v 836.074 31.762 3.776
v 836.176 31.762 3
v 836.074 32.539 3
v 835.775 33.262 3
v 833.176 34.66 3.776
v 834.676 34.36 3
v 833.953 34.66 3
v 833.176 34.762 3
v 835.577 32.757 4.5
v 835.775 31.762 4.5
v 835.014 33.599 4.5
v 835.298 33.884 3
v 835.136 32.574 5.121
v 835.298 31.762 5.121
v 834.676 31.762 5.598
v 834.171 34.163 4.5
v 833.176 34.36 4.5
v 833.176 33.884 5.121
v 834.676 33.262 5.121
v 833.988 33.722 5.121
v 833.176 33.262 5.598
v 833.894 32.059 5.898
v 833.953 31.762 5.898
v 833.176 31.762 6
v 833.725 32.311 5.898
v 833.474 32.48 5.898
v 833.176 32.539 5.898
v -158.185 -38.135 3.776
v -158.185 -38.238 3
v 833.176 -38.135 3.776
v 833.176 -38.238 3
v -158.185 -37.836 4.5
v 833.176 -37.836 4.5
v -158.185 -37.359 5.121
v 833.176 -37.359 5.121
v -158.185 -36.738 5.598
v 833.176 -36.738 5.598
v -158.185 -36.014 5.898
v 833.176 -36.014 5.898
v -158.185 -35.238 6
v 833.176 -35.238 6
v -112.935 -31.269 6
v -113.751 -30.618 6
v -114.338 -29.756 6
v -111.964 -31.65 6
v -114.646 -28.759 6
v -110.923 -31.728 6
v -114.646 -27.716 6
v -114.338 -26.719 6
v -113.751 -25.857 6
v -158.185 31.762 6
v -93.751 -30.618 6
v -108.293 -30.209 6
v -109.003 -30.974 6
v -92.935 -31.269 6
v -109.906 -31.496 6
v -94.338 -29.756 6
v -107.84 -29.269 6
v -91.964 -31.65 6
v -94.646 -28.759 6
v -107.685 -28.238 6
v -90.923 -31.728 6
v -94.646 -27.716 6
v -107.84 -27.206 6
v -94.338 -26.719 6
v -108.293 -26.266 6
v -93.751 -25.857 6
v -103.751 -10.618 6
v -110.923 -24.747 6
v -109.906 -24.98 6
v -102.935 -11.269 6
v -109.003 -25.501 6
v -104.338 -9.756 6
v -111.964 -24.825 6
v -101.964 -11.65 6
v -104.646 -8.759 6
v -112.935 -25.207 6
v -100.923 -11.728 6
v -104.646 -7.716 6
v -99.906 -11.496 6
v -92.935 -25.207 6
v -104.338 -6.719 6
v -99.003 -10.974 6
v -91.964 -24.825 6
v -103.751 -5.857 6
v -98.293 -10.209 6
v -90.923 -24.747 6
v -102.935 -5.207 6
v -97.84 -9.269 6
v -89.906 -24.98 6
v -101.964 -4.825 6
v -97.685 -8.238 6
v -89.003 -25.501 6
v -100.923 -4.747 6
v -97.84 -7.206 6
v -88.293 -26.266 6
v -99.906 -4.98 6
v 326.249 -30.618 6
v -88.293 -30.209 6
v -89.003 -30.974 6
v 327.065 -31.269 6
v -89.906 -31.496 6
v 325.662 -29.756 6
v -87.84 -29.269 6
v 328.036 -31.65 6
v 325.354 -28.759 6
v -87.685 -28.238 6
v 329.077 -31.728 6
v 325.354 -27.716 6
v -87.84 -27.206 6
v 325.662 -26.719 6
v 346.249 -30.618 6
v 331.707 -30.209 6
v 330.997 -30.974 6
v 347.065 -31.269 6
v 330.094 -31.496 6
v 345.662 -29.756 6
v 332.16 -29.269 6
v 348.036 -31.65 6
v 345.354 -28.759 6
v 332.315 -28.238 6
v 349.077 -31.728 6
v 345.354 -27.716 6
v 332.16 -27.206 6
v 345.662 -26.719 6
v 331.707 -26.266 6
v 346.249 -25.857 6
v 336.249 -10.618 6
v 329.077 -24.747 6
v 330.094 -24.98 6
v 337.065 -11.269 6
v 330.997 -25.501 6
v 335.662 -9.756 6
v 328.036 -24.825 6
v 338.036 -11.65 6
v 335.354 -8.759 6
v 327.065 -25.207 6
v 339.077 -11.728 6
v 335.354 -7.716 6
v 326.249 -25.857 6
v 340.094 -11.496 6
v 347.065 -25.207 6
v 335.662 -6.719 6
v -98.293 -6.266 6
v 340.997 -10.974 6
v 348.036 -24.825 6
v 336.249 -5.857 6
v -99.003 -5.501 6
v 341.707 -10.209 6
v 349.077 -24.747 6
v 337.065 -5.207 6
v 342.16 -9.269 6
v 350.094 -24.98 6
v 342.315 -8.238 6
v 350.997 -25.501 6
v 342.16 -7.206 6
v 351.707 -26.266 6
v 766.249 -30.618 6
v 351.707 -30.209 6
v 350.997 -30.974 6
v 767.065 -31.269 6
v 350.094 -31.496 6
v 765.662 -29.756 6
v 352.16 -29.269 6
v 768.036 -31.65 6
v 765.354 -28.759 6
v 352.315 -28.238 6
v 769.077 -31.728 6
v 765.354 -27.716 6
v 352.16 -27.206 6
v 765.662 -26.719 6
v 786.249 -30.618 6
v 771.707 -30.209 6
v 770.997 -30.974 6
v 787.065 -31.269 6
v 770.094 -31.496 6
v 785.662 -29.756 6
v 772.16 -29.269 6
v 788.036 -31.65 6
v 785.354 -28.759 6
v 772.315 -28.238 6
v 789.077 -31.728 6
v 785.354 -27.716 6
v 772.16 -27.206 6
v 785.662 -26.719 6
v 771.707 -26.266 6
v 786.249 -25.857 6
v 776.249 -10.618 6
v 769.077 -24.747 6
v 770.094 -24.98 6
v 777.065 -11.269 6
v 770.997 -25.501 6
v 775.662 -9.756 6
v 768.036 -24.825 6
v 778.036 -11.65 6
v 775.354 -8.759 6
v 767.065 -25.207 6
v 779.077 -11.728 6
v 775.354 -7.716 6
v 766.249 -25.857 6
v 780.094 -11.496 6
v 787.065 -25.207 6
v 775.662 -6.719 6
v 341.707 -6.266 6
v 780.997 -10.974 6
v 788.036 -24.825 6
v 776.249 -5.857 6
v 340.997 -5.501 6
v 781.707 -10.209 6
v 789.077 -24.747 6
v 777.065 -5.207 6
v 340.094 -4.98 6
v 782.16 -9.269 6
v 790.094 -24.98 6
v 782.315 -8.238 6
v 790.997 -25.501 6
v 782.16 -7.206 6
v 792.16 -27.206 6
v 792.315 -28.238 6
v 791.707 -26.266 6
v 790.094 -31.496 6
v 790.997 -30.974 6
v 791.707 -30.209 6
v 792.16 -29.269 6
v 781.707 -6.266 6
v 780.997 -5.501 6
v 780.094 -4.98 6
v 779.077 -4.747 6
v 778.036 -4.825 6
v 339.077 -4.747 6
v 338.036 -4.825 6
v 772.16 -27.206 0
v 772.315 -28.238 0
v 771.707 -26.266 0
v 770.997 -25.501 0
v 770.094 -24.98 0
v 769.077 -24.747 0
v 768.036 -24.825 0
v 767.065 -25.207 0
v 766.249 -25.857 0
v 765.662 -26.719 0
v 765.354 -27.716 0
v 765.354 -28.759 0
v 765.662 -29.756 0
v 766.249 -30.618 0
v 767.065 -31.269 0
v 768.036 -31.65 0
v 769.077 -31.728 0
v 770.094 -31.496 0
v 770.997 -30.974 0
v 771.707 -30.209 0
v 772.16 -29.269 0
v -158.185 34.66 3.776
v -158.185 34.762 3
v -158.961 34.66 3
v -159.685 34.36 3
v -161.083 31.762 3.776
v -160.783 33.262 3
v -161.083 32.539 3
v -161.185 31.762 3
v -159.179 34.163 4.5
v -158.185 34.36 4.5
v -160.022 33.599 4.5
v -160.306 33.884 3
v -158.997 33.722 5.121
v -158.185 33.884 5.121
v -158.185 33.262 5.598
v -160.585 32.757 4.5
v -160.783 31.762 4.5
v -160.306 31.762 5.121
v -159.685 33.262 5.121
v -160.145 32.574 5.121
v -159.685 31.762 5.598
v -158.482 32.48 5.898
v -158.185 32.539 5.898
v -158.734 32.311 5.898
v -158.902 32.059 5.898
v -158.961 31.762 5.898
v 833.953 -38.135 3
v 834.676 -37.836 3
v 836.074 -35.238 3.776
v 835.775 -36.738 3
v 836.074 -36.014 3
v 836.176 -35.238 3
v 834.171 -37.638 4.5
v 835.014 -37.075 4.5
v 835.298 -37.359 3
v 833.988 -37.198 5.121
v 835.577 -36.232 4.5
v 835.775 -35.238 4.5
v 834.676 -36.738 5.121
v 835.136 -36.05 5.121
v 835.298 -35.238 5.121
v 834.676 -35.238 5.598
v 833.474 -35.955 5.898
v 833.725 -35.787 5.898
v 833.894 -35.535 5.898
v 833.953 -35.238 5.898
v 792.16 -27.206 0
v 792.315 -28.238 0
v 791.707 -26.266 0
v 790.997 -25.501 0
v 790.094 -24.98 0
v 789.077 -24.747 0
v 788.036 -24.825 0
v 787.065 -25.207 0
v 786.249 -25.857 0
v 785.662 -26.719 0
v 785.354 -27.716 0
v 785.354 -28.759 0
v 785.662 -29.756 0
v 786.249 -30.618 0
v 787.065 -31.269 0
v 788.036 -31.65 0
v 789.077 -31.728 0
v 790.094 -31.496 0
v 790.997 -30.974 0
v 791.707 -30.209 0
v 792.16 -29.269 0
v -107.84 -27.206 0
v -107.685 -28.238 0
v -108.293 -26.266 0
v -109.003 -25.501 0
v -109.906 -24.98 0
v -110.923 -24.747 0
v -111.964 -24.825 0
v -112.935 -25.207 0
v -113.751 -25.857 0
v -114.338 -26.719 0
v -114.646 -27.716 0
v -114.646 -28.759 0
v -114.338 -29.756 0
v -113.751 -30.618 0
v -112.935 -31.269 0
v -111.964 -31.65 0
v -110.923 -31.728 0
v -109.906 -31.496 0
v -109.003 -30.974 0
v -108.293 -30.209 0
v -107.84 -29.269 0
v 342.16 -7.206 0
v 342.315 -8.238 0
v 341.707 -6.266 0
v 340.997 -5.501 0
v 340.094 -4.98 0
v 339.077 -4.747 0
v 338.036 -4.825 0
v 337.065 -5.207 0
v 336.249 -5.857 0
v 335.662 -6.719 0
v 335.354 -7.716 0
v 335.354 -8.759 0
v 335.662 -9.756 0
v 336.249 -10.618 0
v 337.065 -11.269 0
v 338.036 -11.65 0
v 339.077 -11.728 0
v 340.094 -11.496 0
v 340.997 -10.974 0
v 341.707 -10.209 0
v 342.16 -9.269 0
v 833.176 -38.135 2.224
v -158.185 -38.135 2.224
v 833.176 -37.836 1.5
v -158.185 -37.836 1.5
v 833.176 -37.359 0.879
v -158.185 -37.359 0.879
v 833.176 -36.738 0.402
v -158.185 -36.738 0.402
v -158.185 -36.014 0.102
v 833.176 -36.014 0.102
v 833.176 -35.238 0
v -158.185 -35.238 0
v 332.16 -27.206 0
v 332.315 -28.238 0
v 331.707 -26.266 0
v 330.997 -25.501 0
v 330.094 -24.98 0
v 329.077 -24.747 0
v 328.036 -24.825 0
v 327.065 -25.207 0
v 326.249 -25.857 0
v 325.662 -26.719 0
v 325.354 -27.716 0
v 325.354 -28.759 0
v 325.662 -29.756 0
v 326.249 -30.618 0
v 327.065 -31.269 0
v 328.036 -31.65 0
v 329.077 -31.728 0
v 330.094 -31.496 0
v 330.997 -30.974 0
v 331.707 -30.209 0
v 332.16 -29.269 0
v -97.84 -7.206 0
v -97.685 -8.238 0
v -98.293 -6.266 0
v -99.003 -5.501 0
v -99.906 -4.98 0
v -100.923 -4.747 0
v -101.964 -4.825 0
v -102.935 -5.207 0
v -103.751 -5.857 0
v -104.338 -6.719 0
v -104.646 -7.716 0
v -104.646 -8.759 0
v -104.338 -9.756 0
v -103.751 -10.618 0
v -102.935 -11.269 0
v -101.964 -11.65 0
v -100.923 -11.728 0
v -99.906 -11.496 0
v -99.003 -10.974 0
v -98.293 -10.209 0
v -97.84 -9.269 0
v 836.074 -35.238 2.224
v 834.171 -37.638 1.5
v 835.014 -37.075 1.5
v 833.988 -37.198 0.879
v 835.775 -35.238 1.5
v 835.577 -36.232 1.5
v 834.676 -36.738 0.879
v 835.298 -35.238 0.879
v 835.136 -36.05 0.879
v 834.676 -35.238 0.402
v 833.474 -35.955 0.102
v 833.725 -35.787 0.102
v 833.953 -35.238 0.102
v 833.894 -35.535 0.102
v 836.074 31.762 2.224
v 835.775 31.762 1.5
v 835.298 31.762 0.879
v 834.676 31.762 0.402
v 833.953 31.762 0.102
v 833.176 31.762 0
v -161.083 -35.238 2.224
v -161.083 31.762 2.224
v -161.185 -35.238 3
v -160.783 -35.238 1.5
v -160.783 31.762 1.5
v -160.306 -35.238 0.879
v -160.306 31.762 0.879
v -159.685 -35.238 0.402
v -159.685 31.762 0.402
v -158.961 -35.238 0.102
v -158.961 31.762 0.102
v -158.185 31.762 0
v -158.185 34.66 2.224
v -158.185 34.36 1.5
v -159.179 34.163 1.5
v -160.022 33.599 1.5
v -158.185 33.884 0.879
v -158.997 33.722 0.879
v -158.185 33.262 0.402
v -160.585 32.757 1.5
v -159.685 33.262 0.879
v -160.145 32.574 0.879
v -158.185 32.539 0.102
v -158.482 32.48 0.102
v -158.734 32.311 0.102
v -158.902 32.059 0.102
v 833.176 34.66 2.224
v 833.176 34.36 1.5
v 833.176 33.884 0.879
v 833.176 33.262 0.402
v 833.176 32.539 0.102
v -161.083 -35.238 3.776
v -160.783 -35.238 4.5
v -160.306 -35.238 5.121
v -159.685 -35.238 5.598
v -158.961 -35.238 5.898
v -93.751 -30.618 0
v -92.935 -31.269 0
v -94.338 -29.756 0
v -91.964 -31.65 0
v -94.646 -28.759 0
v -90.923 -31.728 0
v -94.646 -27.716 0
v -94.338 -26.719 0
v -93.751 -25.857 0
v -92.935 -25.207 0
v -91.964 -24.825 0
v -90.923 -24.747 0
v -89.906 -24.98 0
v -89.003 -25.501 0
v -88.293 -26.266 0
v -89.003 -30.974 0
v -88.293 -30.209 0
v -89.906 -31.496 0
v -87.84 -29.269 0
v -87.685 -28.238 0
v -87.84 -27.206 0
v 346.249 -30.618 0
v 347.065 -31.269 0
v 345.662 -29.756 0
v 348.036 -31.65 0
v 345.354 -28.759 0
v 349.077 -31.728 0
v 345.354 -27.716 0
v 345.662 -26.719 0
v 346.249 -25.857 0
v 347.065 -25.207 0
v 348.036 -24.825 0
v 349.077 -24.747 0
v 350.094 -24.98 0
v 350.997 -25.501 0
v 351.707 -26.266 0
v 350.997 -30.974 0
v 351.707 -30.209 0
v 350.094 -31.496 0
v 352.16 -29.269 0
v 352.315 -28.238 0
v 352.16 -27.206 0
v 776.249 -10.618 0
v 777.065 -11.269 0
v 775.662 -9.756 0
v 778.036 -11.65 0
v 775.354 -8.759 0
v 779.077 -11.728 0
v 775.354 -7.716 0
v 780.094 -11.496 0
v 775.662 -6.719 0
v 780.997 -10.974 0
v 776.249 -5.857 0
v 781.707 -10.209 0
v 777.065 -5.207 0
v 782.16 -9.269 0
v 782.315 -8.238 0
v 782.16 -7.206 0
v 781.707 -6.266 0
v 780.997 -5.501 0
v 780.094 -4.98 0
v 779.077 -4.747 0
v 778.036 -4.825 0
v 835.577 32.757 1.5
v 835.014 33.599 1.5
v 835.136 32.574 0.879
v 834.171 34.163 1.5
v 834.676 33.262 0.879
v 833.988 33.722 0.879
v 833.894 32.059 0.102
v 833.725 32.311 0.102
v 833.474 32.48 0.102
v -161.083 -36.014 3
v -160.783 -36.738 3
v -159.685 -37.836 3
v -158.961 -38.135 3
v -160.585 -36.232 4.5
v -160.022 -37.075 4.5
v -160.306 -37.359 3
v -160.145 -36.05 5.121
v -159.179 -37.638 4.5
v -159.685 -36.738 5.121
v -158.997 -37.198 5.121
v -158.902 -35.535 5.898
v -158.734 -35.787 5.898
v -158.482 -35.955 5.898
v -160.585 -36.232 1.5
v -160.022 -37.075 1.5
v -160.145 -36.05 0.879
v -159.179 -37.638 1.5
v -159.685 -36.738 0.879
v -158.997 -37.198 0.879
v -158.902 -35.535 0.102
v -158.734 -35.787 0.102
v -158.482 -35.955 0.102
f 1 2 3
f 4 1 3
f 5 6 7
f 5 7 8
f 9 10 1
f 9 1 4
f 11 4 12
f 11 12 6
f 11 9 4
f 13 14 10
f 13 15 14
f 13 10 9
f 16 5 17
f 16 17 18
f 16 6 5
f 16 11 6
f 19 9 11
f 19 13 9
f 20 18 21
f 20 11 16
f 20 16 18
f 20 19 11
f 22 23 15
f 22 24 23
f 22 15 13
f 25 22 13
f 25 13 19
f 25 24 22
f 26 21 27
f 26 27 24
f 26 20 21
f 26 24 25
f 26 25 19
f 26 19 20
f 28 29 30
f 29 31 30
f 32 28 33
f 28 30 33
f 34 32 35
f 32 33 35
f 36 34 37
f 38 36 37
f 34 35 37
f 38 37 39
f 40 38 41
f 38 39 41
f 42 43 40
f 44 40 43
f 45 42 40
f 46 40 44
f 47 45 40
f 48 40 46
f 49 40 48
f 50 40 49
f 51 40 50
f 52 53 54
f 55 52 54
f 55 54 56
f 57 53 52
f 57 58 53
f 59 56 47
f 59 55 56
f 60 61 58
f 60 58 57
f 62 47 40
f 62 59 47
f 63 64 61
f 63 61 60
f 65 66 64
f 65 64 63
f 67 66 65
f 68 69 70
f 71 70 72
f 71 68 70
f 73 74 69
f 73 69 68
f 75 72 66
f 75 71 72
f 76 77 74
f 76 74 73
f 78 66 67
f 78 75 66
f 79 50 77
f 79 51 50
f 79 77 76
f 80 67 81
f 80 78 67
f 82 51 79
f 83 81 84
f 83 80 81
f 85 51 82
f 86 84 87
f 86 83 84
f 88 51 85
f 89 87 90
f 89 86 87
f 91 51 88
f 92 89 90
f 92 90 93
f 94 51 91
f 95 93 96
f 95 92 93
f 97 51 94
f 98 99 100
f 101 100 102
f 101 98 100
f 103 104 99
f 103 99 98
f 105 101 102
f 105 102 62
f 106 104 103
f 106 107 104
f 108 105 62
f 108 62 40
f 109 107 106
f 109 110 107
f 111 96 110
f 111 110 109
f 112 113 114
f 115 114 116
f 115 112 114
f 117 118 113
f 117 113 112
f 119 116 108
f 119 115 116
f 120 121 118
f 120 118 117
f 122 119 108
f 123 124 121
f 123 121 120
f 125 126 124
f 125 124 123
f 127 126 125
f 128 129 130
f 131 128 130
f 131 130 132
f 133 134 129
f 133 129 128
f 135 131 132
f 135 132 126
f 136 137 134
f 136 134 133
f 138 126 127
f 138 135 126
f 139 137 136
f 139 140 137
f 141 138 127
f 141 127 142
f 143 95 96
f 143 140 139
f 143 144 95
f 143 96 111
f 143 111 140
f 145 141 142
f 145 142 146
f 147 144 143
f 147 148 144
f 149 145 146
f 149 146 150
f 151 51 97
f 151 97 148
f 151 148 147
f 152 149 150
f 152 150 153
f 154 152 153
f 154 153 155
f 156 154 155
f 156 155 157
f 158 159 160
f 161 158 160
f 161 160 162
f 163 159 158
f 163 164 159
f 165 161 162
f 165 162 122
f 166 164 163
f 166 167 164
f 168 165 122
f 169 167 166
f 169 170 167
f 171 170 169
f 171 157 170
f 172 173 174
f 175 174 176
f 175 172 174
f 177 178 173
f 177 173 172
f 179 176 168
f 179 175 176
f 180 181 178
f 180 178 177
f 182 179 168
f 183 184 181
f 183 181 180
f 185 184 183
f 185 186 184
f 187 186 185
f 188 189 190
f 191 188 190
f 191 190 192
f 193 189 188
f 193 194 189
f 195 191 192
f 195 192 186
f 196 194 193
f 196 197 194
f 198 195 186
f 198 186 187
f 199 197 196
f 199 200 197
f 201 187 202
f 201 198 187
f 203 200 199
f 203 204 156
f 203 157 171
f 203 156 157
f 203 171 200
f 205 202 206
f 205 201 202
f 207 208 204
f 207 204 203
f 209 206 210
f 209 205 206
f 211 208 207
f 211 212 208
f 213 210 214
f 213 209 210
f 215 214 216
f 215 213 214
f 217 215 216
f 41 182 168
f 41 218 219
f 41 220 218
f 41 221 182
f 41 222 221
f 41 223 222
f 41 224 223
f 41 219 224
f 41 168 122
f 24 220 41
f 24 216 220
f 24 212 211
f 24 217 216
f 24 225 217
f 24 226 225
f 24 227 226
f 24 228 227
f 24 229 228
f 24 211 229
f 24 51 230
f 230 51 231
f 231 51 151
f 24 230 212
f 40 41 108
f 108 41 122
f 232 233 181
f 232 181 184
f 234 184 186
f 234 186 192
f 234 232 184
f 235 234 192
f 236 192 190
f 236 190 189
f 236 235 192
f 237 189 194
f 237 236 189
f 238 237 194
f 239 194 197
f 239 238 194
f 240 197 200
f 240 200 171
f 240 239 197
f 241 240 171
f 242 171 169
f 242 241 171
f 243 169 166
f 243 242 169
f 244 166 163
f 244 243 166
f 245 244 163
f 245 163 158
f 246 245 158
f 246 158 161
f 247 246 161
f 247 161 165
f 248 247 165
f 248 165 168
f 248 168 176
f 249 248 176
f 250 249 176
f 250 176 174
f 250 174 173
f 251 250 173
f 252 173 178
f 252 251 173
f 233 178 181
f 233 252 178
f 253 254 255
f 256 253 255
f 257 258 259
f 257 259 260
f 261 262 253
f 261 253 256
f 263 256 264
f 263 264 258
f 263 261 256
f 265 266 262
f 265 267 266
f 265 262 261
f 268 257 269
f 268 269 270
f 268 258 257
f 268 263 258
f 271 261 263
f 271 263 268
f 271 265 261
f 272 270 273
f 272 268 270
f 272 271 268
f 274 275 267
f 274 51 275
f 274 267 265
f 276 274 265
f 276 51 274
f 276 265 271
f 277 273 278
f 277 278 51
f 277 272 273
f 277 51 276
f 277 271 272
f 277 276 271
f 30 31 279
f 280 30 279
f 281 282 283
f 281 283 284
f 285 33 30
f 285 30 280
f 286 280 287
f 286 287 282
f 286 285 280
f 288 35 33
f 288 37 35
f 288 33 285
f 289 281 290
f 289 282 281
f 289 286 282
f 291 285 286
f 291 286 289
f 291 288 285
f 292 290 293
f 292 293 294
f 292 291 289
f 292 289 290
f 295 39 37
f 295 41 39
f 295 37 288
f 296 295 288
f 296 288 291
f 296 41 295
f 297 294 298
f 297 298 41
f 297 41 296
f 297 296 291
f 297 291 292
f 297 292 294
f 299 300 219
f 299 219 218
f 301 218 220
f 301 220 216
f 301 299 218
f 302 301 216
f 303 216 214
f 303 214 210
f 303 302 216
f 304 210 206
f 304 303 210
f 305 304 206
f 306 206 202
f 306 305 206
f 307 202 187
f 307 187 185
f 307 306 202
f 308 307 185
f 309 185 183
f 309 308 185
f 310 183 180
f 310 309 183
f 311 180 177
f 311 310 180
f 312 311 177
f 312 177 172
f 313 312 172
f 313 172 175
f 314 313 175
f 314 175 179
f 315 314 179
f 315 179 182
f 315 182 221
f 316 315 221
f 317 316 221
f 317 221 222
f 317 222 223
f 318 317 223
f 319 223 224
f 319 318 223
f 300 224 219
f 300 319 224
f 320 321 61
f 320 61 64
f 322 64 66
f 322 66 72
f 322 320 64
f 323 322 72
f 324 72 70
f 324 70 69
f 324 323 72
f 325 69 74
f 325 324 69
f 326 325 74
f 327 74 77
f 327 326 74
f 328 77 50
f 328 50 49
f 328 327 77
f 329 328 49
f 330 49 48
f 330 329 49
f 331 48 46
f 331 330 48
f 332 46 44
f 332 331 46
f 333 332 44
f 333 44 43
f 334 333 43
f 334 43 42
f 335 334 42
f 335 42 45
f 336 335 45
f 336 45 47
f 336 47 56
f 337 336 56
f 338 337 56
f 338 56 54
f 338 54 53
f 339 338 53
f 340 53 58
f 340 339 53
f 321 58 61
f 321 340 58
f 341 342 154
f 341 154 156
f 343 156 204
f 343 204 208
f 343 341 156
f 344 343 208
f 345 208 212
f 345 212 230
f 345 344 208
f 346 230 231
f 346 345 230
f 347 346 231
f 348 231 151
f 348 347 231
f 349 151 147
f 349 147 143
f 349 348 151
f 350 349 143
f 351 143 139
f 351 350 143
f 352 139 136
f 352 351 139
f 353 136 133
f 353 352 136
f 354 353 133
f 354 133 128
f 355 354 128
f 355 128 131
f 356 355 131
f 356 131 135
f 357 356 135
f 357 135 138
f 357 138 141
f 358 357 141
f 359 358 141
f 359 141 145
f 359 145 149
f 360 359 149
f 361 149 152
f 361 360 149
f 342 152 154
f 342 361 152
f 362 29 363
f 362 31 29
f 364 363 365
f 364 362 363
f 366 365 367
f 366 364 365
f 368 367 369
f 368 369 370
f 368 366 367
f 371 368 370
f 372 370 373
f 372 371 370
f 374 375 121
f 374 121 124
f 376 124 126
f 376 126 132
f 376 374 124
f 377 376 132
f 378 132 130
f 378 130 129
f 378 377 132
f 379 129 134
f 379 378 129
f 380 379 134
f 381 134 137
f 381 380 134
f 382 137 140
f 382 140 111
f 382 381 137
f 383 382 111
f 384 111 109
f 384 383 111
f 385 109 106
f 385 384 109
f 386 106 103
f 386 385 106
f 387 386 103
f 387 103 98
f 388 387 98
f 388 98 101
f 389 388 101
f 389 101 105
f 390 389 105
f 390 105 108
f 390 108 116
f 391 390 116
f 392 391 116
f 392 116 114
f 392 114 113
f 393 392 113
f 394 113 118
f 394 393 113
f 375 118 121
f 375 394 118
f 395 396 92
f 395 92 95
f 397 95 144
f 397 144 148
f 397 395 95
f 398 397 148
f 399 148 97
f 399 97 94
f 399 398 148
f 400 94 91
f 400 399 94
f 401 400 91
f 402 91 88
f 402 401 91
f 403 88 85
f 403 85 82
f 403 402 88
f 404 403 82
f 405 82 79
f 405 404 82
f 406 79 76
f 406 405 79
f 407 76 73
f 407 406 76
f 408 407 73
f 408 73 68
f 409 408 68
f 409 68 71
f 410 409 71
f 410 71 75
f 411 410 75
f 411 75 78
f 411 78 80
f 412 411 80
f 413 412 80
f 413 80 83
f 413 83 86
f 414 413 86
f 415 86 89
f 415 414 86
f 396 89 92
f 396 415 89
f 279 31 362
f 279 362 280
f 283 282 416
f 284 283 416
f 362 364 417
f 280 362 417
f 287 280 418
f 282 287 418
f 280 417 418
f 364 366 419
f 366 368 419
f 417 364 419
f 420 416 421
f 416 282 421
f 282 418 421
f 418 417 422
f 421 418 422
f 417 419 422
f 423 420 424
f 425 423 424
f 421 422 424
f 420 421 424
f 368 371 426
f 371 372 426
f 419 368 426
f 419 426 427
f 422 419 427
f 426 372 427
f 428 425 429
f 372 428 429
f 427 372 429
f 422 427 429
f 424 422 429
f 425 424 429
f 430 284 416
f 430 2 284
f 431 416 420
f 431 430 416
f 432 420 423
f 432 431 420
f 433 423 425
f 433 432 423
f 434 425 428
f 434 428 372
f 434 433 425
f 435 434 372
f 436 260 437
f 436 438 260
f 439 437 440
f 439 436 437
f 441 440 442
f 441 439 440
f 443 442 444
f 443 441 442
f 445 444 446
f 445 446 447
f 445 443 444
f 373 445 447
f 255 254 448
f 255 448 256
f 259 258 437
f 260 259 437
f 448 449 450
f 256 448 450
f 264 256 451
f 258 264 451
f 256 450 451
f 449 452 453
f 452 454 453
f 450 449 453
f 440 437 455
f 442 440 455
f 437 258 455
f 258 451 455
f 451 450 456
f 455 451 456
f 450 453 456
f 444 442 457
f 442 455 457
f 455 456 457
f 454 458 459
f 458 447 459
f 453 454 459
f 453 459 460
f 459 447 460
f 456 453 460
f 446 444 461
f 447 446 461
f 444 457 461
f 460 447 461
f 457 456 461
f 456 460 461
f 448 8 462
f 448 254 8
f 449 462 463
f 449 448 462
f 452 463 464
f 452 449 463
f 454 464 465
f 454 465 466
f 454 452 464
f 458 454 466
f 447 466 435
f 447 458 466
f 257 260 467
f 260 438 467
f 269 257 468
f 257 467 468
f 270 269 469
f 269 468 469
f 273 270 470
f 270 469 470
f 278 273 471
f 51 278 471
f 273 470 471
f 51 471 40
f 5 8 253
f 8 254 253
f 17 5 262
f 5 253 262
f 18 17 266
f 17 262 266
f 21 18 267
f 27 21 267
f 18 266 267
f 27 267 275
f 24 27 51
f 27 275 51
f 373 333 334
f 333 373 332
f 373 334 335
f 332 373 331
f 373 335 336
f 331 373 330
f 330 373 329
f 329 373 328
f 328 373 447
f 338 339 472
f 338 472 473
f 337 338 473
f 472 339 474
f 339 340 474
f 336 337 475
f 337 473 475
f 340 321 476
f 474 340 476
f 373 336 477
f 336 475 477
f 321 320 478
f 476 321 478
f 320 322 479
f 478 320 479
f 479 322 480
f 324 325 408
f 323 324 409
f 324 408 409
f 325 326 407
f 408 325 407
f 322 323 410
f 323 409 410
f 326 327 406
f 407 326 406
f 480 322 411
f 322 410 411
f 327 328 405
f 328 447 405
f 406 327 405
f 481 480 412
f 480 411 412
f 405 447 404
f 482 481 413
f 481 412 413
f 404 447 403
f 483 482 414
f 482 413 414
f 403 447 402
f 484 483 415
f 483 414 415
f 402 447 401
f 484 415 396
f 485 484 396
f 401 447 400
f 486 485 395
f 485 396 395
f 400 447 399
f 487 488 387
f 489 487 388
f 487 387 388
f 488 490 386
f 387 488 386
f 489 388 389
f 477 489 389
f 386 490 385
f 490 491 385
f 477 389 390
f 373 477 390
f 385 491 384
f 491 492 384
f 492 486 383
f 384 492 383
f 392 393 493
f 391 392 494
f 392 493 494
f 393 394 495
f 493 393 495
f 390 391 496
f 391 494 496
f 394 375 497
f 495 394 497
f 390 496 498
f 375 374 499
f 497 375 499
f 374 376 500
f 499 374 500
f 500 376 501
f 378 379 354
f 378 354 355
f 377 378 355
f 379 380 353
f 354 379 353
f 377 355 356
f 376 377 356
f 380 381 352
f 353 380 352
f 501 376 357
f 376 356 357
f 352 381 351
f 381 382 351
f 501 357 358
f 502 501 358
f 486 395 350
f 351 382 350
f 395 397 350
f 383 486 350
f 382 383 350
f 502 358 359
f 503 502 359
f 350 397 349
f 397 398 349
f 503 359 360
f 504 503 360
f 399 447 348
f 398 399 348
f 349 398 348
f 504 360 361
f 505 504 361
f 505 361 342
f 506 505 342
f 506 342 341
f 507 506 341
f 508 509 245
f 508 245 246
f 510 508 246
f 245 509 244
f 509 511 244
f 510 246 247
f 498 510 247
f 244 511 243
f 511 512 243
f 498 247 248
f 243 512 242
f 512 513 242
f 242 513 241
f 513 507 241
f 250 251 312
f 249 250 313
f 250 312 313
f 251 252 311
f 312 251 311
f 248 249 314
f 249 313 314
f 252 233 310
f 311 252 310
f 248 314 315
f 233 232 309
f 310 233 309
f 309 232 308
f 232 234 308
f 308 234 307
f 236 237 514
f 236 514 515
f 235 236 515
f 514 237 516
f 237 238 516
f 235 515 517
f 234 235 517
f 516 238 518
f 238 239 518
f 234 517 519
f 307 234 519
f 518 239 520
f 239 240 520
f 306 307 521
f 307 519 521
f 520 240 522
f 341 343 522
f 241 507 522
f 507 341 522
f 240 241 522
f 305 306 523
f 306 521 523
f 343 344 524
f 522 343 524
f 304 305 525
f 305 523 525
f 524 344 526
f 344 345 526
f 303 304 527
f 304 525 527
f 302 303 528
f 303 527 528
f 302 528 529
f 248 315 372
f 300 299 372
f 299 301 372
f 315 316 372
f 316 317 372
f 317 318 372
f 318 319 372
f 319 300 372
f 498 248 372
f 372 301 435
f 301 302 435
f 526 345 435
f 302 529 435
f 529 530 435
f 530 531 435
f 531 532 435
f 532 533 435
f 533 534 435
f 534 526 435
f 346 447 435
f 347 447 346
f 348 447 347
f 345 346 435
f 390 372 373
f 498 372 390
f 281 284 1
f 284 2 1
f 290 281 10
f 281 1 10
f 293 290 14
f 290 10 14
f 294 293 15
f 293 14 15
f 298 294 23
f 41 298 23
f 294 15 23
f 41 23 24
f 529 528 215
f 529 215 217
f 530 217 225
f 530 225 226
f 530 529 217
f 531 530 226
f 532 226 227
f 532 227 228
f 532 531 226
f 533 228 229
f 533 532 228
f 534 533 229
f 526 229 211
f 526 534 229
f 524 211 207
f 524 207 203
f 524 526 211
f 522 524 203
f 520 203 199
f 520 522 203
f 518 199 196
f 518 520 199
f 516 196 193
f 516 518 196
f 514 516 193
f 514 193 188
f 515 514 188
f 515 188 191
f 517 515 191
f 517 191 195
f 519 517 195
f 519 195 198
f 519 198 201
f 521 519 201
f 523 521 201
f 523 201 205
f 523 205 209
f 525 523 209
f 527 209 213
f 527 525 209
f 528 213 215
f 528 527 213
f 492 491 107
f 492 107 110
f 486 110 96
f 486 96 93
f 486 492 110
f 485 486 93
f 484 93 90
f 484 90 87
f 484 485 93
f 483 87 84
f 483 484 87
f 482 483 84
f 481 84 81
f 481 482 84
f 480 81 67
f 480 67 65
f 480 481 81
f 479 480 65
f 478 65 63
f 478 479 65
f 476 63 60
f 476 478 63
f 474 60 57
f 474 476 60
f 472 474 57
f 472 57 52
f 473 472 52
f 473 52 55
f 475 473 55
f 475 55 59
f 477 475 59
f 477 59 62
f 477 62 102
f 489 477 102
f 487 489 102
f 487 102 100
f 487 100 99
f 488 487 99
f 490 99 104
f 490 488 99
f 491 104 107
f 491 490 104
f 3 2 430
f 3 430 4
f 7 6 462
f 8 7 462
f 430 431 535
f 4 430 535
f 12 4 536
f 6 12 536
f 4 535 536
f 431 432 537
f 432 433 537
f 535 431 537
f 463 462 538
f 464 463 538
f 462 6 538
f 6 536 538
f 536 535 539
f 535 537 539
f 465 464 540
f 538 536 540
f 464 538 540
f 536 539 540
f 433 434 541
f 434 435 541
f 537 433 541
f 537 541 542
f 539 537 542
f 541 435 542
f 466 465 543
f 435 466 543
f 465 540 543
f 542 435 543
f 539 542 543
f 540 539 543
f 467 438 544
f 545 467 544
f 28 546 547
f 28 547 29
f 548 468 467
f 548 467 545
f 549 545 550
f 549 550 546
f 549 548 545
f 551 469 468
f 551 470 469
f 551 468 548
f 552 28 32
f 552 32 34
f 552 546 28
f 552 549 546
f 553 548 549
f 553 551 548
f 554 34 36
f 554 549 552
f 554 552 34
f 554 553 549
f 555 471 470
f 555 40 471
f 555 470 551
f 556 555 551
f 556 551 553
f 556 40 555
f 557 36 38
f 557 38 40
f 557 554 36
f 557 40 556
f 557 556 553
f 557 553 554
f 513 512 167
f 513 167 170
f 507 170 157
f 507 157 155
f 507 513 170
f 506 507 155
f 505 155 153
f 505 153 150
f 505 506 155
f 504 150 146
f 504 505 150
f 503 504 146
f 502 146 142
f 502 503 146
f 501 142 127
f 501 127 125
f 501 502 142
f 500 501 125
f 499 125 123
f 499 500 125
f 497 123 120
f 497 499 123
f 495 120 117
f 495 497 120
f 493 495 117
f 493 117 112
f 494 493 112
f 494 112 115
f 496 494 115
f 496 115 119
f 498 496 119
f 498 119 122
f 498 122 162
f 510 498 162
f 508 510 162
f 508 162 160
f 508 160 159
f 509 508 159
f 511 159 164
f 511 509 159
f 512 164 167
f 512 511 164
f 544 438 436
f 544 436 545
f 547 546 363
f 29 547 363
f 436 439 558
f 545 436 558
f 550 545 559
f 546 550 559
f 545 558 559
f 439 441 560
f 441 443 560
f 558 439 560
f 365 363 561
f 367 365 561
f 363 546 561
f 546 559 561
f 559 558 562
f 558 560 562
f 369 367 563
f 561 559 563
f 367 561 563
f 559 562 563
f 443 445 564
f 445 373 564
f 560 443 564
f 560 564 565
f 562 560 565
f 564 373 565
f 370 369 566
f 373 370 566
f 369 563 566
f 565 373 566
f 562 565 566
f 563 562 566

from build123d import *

# Parameters (mm, degrees)
F0_R     = 3.5
F1_DEPTH = 6
F2_R     = 2.99999


# Not quite as in the source:
# - a fillet or chamfer is up to 0.001 mm smaller than in the source, because OpenCascade refuses the exact size


with BuildPart() as f1:
    # F0 (on Top) → F1 (new body)
    with BuildSketch(Plane.XY):
        with BuildLine():
            Line((833.1764324449, 34.7622951977), (-158.1848585529, 34.7622951977))
            ThreePointArc((-158.1848585529, 34.7622951977), (-160.3061788964, 33.8836155413), (-161.1848585529, 31.7622951977))
            Line((-161.1848585529, 31.7622951977), (-161.1848585529, -35.2377048023))
            ThreePointArc((-161.1848585529, -35.2377048023), (-160.3061788964, -37.3590251459), (-158.1848585529, -38.2377048023))
            Line((-158.1848585529, -38.2377048023), (833.1764324449, -38.2377048023))
            ThreePointArc((833.1764324449, -38.2377048023), (835.2977527885, -37.3590251459), (836.1764324449, -35.2377048023))
            Line((836.1764324449, -35.2377048023), (836.1764324449, 31.7622951977))
            ThreePointArc((836.1764324449, 31.7622951977), (835.2977527885, 33.8836155413), (833.1764324449, 34.7622951977))
        make_face()
        with Locations((-111.1848585529, -28.2377048023)):
            Circle(F0_R, mode=Mode.SUBTRACT)
        with Locations((-91.1848585529, -28.2377048023)):
            Circle(F0_R, mode=Mode.SUBTRACT)
        with Locations((328.8151414471, -28.2377048023)):
            Circle(F0_R, mode=Mode.SUBTRACT)
        with Locations((-101.1848585529, -8.2377048023)):
            Circle(F0_R, mode=Mode.SUBTRACT)
        with Locations((348.8151414471, -28.2377048023)):
            Circle(F0_R, mode=Mode.SUBTRACT)
        with Locations((768.8151414471, -28.2377048023)):
            Circle(F0_R, mode=Mode.SUBTRACT)
        with Locations((788.8151414471, -28.2377048023)):
            Circle(F0_R, mode=Mode.SUBTRACT)
        with Locations((338.8151414471, -8.2377048023)):
            Circle(F0_R, mode=Mode.SUBTRACT)
        with Locations((778.8151414471, -8.2377048023)):
            Circle(F0_R, mode=Mode.SUBTRACT)
    extrude(amount=F1_DEPTH)

    # F2 (radius 3 in the source; OpenCascade refuses exactly that, so slightly less here)
    f2_edges = [f1.edges().sort_by_distance(p)[0] for p in [
        (836.176432, -35.237705, 3),
        (836.176432, 31.762295, 3),
        (836.176432, -1.737705, 0),
        (836.176432, -1.737705, 6),
    ]]
    fillet(f2_edges, radius=F2_R)


solid = f1.part
